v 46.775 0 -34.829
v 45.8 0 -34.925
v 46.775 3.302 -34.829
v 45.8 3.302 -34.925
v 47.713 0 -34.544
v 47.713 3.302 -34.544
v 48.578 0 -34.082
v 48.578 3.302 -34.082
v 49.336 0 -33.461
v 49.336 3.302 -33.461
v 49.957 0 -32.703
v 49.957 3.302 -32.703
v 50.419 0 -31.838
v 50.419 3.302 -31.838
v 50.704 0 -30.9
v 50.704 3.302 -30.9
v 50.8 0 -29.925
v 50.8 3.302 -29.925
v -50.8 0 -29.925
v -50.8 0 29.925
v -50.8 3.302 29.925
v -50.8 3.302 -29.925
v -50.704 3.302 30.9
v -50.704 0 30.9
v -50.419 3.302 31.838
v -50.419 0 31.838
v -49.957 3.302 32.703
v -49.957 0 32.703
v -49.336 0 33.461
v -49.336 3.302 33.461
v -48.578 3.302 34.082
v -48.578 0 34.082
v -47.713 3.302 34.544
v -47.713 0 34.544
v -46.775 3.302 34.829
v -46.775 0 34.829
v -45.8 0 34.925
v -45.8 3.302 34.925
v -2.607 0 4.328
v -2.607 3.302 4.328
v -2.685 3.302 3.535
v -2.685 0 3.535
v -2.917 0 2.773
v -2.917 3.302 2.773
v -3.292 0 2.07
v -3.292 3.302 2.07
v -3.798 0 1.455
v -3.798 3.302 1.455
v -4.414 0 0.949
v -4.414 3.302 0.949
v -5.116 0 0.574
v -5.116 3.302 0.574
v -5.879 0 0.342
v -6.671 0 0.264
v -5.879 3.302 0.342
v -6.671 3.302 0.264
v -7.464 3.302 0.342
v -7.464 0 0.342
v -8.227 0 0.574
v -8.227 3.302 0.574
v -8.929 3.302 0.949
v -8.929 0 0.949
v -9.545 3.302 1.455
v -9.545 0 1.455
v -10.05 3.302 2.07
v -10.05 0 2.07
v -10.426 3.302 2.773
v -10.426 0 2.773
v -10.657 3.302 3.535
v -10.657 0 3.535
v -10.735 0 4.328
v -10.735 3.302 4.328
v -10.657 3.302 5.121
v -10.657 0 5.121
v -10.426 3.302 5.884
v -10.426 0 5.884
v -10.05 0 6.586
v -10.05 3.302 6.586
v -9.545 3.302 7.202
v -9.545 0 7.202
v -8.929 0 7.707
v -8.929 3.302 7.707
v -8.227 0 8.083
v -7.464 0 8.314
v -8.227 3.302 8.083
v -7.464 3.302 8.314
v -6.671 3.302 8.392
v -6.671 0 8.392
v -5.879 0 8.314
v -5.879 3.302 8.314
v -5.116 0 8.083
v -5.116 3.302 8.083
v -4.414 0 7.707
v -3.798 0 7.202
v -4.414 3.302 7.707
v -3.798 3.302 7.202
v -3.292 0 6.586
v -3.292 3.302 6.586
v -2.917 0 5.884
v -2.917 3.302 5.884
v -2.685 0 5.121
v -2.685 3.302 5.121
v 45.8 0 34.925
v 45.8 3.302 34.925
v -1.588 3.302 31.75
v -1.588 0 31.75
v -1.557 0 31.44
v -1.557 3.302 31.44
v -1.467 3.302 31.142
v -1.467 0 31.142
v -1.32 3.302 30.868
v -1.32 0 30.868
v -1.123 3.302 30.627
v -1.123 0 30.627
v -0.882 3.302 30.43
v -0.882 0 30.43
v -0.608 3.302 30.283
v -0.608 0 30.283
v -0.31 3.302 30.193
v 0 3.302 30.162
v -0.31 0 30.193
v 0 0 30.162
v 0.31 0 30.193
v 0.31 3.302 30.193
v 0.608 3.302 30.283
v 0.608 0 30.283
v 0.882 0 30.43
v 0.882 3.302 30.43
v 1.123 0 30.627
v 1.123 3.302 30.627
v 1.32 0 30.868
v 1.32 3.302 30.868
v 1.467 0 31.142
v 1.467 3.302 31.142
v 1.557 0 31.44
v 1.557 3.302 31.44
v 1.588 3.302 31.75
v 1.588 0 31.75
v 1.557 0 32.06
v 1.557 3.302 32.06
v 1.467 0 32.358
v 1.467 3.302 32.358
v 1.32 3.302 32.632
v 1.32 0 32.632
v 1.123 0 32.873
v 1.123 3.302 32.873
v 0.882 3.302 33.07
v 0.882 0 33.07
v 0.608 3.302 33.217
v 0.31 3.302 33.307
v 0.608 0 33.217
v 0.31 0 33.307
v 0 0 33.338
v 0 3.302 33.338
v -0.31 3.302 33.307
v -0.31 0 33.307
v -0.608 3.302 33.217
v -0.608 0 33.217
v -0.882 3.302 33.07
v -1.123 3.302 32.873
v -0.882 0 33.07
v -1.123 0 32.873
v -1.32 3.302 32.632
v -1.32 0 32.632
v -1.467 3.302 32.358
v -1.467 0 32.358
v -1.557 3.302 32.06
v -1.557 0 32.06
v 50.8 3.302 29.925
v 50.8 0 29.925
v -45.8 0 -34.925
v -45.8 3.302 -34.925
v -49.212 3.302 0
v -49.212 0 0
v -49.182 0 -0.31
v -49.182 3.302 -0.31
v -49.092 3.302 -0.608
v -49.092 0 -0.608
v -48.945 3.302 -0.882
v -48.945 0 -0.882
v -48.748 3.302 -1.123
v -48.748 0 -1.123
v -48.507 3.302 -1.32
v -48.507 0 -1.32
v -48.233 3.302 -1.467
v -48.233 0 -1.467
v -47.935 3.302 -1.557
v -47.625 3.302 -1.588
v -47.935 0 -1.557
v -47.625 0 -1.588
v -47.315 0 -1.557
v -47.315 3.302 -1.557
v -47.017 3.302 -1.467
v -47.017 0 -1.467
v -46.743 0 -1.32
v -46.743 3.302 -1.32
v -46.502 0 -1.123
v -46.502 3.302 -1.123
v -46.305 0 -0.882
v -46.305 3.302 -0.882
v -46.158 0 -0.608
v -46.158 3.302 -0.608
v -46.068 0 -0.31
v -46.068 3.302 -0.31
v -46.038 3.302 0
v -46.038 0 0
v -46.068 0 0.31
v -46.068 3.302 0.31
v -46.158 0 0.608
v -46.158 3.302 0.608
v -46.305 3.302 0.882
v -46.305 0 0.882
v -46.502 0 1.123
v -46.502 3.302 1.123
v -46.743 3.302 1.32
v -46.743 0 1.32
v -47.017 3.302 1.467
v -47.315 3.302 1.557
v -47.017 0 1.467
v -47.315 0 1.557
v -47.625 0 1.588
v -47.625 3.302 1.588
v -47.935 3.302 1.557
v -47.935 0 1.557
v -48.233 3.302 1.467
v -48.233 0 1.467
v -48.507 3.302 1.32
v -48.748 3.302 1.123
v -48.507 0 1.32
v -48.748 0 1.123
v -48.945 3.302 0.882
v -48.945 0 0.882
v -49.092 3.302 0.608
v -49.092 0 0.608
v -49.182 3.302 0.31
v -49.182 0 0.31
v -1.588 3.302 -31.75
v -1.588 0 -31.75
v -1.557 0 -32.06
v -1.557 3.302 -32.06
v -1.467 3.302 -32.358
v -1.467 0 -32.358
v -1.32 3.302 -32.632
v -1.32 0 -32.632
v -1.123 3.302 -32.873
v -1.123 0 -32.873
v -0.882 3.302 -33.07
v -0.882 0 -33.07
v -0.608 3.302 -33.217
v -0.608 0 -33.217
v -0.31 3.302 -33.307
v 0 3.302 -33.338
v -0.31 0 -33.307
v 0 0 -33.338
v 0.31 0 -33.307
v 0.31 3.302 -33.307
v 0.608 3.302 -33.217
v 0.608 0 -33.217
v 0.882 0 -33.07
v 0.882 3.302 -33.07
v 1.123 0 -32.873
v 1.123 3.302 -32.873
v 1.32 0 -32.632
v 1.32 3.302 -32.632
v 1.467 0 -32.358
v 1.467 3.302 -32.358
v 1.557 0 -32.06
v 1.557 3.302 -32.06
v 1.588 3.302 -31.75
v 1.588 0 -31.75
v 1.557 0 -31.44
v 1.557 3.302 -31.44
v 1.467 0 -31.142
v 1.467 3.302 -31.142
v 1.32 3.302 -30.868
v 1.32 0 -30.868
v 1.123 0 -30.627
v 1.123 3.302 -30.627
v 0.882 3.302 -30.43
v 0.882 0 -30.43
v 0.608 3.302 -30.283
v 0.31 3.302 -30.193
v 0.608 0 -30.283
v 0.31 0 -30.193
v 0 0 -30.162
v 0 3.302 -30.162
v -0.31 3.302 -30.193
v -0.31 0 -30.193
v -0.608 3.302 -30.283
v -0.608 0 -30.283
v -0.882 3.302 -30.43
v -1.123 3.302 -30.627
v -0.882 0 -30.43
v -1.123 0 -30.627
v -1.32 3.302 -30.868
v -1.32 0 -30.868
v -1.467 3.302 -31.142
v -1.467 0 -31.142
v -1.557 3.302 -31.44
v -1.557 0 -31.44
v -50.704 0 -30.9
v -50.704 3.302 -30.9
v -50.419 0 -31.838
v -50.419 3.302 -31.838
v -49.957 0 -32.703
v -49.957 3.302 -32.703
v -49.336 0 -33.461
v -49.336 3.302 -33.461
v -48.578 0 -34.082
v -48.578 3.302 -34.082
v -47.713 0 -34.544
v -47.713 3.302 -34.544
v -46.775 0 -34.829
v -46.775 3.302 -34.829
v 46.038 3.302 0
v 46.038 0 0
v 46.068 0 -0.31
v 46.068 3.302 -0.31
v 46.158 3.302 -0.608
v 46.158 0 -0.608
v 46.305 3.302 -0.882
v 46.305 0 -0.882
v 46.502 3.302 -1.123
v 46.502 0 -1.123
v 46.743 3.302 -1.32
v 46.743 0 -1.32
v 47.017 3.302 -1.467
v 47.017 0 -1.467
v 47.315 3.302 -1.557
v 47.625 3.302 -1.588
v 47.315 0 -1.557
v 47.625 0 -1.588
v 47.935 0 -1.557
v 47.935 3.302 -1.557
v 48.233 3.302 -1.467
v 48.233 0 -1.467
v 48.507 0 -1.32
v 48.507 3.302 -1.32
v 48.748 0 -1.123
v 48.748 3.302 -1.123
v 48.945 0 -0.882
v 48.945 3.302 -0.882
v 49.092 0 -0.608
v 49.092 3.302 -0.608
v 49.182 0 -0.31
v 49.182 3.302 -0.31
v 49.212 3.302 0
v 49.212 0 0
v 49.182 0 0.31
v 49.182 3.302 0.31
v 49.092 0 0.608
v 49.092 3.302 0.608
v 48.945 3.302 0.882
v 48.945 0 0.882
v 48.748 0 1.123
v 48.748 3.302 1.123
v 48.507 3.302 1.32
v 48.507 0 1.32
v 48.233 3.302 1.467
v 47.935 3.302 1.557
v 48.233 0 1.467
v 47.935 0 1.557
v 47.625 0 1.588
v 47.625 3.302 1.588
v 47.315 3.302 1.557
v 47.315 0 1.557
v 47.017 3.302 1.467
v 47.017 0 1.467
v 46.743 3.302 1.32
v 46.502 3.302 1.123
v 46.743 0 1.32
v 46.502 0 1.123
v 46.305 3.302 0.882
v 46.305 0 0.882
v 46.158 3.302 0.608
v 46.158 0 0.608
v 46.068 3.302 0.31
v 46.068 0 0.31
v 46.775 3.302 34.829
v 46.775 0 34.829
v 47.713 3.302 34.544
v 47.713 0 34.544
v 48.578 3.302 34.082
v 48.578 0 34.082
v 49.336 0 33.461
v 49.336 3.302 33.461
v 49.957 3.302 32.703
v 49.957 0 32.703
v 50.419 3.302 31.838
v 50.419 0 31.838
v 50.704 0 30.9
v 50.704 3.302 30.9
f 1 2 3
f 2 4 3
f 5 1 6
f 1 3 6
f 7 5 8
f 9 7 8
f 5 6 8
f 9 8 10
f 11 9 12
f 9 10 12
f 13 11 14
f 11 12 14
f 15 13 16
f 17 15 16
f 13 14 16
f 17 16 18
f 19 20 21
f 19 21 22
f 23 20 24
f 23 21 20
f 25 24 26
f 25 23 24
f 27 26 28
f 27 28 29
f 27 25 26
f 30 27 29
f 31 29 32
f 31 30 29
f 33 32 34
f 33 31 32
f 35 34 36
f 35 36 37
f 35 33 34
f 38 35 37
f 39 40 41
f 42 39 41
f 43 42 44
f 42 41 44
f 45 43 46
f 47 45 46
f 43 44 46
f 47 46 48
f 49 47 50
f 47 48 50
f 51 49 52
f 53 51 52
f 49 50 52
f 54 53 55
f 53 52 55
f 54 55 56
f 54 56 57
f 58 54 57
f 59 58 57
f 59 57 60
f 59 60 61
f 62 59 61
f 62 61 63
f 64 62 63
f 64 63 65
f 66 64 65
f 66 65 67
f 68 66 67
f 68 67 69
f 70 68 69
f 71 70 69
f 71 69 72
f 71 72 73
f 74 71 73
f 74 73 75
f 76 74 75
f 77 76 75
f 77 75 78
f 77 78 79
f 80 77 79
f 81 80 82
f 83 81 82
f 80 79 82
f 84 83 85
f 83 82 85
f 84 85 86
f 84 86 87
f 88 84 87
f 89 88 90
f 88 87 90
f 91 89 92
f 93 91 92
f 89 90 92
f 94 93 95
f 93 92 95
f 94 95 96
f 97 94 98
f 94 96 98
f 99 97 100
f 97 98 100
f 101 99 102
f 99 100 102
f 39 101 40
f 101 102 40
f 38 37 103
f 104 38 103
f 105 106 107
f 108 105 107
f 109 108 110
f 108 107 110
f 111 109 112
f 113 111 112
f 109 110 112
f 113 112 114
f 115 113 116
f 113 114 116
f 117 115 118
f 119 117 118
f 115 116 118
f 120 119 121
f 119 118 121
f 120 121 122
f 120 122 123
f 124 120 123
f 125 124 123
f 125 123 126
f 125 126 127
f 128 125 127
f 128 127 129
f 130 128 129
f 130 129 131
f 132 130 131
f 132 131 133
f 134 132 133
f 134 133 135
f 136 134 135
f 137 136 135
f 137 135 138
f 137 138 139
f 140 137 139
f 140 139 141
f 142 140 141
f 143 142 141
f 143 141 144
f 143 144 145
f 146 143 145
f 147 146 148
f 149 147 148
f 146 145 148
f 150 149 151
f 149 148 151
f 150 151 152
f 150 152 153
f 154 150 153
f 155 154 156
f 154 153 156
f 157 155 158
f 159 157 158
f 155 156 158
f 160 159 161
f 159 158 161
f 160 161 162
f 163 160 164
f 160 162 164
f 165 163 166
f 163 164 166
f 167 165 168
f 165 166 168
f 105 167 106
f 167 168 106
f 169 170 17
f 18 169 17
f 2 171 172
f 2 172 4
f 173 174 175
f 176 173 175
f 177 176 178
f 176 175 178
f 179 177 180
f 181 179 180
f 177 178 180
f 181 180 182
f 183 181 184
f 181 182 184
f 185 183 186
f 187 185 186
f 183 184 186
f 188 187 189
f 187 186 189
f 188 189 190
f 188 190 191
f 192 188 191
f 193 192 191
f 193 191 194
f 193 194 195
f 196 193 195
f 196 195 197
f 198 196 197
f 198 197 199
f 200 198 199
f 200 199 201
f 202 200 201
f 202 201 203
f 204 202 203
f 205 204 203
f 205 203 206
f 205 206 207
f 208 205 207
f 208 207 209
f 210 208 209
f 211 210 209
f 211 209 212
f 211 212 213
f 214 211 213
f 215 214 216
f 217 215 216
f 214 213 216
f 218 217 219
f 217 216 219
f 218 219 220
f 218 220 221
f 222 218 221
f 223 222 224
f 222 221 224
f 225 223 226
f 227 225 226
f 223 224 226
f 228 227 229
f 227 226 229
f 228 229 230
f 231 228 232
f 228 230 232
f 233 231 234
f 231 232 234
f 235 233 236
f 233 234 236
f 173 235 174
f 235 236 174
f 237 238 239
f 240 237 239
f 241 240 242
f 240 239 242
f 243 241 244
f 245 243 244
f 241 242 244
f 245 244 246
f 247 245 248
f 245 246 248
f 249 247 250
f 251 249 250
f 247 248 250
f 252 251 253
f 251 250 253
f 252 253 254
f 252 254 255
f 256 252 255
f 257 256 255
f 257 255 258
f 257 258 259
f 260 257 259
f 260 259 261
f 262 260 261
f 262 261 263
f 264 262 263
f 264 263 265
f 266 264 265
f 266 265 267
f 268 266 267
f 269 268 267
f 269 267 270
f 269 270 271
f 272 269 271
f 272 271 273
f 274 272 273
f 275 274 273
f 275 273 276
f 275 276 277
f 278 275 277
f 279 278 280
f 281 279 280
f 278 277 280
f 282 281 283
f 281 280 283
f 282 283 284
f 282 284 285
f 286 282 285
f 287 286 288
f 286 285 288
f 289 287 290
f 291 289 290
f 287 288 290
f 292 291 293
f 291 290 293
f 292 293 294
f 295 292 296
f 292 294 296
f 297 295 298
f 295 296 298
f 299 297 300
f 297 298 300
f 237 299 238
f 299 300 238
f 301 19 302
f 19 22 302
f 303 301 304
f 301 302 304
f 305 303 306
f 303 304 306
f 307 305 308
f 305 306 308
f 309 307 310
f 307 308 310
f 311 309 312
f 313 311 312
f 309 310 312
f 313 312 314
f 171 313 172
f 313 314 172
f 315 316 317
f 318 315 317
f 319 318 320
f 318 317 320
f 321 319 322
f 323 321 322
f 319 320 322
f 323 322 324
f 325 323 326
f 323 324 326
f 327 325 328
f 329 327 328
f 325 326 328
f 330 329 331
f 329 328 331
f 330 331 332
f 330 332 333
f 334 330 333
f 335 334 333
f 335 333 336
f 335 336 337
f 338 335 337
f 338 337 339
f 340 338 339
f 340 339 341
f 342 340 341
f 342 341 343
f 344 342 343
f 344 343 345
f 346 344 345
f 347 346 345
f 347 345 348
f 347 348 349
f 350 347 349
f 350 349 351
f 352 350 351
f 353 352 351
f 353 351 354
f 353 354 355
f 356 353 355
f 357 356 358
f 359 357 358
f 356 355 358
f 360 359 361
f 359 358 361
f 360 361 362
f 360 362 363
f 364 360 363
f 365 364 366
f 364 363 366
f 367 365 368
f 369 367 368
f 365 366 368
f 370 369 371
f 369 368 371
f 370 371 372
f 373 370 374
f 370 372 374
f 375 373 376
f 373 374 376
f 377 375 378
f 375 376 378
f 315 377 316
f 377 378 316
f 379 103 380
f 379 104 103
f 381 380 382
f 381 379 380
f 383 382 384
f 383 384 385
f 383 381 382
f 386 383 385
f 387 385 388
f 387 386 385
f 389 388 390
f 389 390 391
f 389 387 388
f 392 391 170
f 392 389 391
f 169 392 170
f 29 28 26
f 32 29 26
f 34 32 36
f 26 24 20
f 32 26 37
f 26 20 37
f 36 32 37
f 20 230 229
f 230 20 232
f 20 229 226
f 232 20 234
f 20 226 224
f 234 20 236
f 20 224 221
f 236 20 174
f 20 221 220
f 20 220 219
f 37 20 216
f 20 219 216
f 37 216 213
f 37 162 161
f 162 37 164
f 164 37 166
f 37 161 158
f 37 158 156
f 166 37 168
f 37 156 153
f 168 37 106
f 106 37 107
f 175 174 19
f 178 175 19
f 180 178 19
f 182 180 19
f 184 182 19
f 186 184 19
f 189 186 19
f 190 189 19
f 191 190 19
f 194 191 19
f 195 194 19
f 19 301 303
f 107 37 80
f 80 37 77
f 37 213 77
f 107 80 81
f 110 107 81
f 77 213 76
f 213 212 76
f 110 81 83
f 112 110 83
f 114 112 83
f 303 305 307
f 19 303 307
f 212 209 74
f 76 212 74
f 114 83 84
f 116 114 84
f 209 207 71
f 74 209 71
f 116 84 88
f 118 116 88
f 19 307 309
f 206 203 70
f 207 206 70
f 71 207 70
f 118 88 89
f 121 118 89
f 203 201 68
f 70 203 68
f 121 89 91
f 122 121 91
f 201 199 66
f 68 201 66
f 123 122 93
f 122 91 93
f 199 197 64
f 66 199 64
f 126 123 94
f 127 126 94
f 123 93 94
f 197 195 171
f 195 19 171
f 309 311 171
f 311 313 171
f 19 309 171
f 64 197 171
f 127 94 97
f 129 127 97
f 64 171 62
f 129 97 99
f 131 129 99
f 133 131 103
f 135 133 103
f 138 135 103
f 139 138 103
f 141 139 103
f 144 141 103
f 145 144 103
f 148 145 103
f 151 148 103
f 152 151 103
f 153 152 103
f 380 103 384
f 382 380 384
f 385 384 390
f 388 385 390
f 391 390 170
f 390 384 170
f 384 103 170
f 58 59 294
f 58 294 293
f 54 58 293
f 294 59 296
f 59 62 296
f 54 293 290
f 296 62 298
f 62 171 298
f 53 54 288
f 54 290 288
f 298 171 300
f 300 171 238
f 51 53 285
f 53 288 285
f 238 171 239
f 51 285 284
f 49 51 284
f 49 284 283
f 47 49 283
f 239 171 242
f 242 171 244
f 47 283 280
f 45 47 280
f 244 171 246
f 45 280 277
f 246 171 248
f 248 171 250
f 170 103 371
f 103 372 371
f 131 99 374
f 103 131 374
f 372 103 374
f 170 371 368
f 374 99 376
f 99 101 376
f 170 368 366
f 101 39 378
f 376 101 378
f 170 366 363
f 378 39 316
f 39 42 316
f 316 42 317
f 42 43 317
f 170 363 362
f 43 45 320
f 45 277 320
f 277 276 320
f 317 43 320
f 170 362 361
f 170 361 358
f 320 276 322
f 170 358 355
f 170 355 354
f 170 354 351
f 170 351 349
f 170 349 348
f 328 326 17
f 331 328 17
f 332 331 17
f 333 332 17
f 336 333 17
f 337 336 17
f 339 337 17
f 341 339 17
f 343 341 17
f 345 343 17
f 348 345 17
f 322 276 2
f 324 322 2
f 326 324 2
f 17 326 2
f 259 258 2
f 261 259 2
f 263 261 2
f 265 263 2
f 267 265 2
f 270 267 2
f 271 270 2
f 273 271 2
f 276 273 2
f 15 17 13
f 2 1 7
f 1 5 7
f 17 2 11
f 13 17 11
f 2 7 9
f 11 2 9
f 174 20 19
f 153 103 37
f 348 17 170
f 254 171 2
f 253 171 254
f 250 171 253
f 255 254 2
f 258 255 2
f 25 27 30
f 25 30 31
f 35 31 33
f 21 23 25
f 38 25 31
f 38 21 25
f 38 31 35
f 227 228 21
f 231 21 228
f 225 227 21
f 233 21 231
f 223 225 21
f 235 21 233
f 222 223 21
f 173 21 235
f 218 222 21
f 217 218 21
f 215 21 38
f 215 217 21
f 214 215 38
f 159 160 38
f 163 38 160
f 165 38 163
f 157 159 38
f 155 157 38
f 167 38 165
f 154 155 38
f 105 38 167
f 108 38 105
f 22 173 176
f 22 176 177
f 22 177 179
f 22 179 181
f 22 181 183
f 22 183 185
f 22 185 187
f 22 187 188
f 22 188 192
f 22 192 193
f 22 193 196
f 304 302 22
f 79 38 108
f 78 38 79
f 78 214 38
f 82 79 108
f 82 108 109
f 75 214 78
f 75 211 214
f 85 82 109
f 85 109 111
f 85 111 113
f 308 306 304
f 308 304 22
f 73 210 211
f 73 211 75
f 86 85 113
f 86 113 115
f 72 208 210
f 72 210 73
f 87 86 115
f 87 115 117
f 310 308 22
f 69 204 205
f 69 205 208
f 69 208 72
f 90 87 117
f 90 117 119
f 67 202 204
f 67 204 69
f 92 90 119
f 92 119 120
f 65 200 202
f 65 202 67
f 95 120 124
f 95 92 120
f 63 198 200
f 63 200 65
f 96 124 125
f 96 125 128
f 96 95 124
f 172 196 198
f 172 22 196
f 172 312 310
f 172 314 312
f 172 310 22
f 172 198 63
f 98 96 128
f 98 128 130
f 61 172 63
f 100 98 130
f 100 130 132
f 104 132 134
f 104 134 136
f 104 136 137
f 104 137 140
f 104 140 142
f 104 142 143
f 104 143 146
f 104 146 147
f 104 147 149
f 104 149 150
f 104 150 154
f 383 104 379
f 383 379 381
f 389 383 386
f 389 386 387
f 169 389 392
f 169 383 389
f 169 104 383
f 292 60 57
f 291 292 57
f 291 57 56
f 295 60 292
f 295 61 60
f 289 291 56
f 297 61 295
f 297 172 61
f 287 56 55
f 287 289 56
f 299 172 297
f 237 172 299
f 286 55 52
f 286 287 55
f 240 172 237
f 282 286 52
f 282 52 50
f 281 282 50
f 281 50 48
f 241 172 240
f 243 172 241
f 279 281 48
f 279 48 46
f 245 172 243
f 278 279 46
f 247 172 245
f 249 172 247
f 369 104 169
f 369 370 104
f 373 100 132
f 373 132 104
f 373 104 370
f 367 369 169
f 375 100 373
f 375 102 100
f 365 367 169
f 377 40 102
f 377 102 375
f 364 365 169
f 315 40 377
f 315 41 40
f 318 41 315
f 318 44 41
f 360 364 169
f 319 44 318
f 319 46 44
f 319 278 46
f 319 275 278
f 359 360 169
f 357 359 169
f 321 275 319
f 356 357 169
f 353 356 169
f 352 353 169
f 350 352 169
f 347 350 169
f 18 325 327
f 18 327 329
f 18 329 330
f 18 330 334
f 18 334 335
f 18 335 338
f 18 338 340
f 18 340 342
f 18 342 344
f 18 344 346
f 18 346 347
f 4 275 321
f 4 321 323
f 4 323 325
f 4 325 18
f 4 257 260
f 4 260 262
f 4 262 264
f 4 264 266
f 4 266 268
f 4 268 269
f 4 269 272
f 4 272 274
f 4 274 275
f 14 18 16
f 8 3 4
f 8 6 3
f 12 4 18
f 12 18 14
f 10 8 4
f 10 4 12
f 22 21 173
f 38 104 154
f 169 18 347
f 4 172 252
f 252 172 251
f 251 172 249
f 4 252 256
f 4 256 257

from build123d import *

# Parameters (mm, degrees)
SKETCH1_W           = 101.6
SKETCH1_H           = 69.85
BOSS_EXTRUDE1_DEPTH = 3.302
SKETCH4_R           = 1.5875
CUT_EXTRUDE1_DEPTH  = 4.302
FILLET1_R           = 5
SKETCH5_R           = 4.064
CUT_EXTRUDE2_DEPTH  = 4.302


with BuildPart() as part:
    # Sketch1 → Boss-Extrude1 (new body)
    with BuildSketch(Plane(origin=(0, 0, 0), x_dir=(1, 0, 0), z_dir=(0, 1, 0))):
        Rectangle(SKETCH1_W, SKETCH1_H)
    extrude(amount=BOSS_EXTRUDE1_DEPTH)

    # Sketch4 → Cut-Extrude1 (cut, through all)
    with BuildSketch(Plane(origin=(0, 0, 0), x_dir=(-1, 0, 0), z_dir=(0, -1, 0))):
        with Locations((0, 31.75)):
            Circle(SKETCH4_R)
        with Locations((-47.625, 0)):
            Circle(SKETCH4_R)
        with Locations((0, -31.75)):
            Circle(SKETCH4_R)
        with Locations((47.625, 0)):
            Circle(SKETCH4_R)
    extrude(amount=-CUT_EXTRUDE1_DEPTH, mode=Mode.SUBTRACT)

    # Fillet1
    fillet1_edges = [part.edges().sort_by_distance(p)[0] for p in [
        (50.8, 1.651, 34.925),
        (-50.8, 1.651, 34.925),
        (-50.8, 1.651, -34.925),
        (50.8, 1.651, -34.925),
    ]]
    fillet(fillet1_edges, radius=FILLET1_R)

    # Sketch5 → Cut-Extrude2 (cut, through all)
    with BuildSketch(Plane(origin=(0, 3.302, 0), x_dir=(1, 0, 0), z_dir=(0, 1, 0))):
        with Locations((-6.671406789, -4.328326436)):
            Circle(SKETCH5_R)
    extrude(amount=-CUT_EXTRUDE2_DEPTH, mode=Mode.SUBTRACT)


solid = part.part
